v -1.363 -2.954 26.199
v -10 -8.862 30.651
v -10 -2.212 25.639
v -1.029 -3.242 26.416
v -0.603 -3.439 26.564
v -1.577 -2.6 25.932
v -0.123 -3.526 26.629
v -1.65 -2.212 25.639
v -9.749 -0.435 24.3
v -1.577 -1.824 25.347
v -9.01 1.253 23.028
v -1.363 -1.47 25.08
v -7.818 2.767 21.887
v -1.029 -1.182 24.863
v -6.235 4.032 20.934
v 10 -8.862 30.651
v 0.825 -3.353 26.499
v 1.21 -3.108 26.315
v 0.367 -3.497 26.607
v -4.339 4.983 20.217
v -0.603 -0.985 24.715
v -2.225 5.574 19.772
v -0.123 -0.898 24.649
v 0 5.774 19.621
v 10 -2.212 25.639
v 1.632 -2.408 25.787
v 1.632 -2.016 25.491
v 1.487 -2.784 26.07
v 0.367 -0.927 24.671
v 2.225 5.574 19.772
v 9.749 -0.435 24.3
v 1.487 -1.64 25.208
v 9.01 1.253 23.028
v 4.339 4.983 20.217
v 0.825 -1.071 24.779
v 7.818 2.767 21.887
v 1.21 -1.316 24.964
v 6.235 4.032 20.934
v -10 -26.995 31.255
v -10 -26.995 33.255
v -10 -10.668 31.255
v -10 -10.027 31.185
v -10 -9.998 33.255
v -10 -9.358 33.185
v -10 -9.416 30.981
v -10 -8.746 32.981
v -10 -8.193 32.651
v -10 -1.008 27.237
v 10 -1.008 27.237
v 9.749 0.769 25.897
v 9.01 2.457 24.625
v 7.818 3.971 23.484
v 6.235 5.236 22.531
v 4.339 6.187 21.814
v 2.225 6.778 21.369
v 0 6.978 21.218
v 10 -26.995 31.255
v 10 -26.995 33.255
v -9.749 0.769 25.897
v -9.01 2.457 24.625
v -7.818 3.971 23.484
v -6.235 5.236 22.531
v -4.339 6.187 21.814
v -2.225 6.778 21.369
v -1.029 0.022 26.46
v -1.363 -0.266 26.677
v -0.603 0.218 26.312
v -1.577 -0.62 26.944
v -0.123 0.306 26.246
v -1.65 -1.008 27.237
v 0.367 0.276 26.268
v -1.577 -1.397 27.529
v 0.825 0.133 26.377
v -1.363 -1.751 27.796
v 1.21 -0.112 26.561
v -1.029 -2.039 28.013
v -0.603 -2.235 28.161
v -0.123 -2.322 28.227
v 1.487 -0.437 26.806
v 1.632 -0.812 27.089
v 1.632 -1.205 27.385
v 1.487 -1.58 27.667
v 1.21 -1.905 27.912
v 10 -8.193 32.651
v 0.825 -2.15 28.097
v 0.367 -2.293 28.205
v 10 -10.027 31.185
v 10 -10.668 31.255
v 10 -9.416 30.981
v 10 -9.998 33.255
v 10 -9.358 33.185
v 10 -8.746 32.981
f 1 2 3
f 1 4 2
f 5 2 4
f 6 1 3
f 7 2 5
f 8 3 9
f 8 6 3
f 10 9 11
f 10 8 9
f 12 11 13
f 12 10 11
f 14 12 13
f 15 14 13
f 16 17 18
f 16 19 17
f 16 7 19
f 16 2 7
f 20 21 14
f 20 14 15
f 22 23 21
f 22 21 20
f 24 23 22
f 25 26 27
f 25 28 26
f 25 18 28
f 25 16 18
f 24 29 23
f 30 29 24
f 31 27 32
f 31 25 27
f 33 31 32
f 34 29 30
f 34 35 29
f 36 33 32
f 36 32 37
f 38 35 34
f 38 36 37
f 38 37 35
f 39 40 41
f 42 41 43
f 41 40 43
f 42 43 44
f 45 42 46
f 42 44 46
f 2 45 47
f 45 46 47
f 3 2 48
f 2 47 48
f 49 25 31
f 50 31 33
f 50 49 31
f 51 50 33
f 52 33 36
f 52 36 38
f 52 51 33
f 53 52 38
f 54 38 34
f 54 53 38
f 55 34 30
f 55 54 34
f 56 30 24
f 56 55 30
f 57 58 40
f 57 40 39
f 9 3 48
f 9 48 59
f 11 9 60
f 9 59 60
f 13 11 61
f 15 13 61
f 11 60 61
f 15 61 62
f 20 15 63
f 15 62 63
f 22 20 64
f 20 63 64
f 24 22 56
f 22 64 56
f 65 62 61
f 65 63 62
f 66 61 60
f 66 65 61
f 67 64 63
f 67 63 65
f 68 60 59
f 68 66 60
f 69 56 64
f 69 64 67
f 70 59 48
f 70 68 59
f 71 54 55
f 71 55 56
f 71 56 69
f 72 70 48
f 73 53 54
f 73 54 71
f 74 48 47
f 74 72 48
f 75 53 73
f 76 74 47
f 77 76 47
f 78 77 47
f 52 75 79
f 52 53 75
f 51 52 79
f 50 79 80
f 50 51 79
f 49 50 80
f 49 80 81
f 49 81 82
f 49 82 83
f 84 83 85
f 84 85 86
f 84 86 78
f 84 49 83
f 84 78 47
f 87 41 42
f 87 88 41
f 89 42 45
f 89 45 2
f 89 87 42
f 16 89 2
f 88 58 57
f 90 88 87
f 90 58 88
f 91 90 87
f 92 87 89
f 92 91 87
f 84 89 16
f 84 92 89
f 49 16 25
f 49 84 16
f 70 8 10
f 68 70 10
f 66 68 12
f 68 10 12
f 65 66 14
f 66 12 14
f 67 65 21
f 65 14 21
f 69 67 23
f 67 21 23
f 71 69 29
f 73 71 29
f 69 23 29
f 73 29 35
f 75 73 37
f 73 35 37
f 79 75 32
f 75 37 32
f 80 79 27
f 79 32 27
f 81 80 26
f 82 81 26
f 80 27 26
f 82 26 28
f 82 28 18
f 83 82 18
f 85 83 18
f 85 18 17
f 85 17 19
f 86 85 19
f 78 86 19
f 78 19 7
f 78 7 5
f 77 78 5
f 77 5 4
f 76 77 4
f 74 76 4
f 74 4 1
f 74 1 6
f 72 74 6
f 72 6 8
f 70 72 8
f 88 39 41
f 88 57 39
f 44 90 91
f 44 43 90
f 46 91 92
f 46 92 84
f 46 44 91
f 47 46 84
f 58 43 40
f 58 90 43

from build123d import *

# Parameters (mm, degrees)
F1_DEPTH = 10
F3_D     = 3.3
F4_R     = 3
F5_R     = 9.99999


# Not quite as in the source:
# - a fillet or chamfer is up to 0.001 mm smaller than in the source, because OpenCascade refuses the exact size


with BuildPart() as f1:
    # F0 (on Right) → F1 (new body, symmetric)
    with BuildSketch(Plane.YZ):
        Polygon((-8.9946911595, 33.2547011177), (-26.9946911595, 33.2547011177), (-26.9946911595, 31.2547011177), (-9.6638817985, 31.2547011177), (5.7743889952, 19.6211296345), (6.9780190415, 21.2184006546), align=None)
    extrude(amount=F1_DEPTH, both=True)

    # F3 (through all)
    with Locations(Plane(origin=(0, 12.7255260612, 16.8873434619), x_dir=(1, 0, 0), z_dir=(0, 0.6018150232, 0.79863551))):
        with Locations((0, -17.1966584849)):
            Hole(F3_D / 2)

    # F4
    f4_edges = [f1.edges().sort_by_distance(p)[0] for p in [
        (0, -8.994691, 33.254701),
        (0, -9.663882, 31.254701),
    ]]
    fillet(f4_edges, radius=F4_R)

    # F5 (radius 10 in the source; OpenCascade refuses exactly that, so slightly less here)
    f5_edges = [f1.edges().sort_by_distance(p)[0] for p in [
        (10, 6.376204, 20.419765),
        (-10, 6.376204, 20.419765),
    ]]
    fillet(f5_edges, radius=F5_R)


solid = f1.part
